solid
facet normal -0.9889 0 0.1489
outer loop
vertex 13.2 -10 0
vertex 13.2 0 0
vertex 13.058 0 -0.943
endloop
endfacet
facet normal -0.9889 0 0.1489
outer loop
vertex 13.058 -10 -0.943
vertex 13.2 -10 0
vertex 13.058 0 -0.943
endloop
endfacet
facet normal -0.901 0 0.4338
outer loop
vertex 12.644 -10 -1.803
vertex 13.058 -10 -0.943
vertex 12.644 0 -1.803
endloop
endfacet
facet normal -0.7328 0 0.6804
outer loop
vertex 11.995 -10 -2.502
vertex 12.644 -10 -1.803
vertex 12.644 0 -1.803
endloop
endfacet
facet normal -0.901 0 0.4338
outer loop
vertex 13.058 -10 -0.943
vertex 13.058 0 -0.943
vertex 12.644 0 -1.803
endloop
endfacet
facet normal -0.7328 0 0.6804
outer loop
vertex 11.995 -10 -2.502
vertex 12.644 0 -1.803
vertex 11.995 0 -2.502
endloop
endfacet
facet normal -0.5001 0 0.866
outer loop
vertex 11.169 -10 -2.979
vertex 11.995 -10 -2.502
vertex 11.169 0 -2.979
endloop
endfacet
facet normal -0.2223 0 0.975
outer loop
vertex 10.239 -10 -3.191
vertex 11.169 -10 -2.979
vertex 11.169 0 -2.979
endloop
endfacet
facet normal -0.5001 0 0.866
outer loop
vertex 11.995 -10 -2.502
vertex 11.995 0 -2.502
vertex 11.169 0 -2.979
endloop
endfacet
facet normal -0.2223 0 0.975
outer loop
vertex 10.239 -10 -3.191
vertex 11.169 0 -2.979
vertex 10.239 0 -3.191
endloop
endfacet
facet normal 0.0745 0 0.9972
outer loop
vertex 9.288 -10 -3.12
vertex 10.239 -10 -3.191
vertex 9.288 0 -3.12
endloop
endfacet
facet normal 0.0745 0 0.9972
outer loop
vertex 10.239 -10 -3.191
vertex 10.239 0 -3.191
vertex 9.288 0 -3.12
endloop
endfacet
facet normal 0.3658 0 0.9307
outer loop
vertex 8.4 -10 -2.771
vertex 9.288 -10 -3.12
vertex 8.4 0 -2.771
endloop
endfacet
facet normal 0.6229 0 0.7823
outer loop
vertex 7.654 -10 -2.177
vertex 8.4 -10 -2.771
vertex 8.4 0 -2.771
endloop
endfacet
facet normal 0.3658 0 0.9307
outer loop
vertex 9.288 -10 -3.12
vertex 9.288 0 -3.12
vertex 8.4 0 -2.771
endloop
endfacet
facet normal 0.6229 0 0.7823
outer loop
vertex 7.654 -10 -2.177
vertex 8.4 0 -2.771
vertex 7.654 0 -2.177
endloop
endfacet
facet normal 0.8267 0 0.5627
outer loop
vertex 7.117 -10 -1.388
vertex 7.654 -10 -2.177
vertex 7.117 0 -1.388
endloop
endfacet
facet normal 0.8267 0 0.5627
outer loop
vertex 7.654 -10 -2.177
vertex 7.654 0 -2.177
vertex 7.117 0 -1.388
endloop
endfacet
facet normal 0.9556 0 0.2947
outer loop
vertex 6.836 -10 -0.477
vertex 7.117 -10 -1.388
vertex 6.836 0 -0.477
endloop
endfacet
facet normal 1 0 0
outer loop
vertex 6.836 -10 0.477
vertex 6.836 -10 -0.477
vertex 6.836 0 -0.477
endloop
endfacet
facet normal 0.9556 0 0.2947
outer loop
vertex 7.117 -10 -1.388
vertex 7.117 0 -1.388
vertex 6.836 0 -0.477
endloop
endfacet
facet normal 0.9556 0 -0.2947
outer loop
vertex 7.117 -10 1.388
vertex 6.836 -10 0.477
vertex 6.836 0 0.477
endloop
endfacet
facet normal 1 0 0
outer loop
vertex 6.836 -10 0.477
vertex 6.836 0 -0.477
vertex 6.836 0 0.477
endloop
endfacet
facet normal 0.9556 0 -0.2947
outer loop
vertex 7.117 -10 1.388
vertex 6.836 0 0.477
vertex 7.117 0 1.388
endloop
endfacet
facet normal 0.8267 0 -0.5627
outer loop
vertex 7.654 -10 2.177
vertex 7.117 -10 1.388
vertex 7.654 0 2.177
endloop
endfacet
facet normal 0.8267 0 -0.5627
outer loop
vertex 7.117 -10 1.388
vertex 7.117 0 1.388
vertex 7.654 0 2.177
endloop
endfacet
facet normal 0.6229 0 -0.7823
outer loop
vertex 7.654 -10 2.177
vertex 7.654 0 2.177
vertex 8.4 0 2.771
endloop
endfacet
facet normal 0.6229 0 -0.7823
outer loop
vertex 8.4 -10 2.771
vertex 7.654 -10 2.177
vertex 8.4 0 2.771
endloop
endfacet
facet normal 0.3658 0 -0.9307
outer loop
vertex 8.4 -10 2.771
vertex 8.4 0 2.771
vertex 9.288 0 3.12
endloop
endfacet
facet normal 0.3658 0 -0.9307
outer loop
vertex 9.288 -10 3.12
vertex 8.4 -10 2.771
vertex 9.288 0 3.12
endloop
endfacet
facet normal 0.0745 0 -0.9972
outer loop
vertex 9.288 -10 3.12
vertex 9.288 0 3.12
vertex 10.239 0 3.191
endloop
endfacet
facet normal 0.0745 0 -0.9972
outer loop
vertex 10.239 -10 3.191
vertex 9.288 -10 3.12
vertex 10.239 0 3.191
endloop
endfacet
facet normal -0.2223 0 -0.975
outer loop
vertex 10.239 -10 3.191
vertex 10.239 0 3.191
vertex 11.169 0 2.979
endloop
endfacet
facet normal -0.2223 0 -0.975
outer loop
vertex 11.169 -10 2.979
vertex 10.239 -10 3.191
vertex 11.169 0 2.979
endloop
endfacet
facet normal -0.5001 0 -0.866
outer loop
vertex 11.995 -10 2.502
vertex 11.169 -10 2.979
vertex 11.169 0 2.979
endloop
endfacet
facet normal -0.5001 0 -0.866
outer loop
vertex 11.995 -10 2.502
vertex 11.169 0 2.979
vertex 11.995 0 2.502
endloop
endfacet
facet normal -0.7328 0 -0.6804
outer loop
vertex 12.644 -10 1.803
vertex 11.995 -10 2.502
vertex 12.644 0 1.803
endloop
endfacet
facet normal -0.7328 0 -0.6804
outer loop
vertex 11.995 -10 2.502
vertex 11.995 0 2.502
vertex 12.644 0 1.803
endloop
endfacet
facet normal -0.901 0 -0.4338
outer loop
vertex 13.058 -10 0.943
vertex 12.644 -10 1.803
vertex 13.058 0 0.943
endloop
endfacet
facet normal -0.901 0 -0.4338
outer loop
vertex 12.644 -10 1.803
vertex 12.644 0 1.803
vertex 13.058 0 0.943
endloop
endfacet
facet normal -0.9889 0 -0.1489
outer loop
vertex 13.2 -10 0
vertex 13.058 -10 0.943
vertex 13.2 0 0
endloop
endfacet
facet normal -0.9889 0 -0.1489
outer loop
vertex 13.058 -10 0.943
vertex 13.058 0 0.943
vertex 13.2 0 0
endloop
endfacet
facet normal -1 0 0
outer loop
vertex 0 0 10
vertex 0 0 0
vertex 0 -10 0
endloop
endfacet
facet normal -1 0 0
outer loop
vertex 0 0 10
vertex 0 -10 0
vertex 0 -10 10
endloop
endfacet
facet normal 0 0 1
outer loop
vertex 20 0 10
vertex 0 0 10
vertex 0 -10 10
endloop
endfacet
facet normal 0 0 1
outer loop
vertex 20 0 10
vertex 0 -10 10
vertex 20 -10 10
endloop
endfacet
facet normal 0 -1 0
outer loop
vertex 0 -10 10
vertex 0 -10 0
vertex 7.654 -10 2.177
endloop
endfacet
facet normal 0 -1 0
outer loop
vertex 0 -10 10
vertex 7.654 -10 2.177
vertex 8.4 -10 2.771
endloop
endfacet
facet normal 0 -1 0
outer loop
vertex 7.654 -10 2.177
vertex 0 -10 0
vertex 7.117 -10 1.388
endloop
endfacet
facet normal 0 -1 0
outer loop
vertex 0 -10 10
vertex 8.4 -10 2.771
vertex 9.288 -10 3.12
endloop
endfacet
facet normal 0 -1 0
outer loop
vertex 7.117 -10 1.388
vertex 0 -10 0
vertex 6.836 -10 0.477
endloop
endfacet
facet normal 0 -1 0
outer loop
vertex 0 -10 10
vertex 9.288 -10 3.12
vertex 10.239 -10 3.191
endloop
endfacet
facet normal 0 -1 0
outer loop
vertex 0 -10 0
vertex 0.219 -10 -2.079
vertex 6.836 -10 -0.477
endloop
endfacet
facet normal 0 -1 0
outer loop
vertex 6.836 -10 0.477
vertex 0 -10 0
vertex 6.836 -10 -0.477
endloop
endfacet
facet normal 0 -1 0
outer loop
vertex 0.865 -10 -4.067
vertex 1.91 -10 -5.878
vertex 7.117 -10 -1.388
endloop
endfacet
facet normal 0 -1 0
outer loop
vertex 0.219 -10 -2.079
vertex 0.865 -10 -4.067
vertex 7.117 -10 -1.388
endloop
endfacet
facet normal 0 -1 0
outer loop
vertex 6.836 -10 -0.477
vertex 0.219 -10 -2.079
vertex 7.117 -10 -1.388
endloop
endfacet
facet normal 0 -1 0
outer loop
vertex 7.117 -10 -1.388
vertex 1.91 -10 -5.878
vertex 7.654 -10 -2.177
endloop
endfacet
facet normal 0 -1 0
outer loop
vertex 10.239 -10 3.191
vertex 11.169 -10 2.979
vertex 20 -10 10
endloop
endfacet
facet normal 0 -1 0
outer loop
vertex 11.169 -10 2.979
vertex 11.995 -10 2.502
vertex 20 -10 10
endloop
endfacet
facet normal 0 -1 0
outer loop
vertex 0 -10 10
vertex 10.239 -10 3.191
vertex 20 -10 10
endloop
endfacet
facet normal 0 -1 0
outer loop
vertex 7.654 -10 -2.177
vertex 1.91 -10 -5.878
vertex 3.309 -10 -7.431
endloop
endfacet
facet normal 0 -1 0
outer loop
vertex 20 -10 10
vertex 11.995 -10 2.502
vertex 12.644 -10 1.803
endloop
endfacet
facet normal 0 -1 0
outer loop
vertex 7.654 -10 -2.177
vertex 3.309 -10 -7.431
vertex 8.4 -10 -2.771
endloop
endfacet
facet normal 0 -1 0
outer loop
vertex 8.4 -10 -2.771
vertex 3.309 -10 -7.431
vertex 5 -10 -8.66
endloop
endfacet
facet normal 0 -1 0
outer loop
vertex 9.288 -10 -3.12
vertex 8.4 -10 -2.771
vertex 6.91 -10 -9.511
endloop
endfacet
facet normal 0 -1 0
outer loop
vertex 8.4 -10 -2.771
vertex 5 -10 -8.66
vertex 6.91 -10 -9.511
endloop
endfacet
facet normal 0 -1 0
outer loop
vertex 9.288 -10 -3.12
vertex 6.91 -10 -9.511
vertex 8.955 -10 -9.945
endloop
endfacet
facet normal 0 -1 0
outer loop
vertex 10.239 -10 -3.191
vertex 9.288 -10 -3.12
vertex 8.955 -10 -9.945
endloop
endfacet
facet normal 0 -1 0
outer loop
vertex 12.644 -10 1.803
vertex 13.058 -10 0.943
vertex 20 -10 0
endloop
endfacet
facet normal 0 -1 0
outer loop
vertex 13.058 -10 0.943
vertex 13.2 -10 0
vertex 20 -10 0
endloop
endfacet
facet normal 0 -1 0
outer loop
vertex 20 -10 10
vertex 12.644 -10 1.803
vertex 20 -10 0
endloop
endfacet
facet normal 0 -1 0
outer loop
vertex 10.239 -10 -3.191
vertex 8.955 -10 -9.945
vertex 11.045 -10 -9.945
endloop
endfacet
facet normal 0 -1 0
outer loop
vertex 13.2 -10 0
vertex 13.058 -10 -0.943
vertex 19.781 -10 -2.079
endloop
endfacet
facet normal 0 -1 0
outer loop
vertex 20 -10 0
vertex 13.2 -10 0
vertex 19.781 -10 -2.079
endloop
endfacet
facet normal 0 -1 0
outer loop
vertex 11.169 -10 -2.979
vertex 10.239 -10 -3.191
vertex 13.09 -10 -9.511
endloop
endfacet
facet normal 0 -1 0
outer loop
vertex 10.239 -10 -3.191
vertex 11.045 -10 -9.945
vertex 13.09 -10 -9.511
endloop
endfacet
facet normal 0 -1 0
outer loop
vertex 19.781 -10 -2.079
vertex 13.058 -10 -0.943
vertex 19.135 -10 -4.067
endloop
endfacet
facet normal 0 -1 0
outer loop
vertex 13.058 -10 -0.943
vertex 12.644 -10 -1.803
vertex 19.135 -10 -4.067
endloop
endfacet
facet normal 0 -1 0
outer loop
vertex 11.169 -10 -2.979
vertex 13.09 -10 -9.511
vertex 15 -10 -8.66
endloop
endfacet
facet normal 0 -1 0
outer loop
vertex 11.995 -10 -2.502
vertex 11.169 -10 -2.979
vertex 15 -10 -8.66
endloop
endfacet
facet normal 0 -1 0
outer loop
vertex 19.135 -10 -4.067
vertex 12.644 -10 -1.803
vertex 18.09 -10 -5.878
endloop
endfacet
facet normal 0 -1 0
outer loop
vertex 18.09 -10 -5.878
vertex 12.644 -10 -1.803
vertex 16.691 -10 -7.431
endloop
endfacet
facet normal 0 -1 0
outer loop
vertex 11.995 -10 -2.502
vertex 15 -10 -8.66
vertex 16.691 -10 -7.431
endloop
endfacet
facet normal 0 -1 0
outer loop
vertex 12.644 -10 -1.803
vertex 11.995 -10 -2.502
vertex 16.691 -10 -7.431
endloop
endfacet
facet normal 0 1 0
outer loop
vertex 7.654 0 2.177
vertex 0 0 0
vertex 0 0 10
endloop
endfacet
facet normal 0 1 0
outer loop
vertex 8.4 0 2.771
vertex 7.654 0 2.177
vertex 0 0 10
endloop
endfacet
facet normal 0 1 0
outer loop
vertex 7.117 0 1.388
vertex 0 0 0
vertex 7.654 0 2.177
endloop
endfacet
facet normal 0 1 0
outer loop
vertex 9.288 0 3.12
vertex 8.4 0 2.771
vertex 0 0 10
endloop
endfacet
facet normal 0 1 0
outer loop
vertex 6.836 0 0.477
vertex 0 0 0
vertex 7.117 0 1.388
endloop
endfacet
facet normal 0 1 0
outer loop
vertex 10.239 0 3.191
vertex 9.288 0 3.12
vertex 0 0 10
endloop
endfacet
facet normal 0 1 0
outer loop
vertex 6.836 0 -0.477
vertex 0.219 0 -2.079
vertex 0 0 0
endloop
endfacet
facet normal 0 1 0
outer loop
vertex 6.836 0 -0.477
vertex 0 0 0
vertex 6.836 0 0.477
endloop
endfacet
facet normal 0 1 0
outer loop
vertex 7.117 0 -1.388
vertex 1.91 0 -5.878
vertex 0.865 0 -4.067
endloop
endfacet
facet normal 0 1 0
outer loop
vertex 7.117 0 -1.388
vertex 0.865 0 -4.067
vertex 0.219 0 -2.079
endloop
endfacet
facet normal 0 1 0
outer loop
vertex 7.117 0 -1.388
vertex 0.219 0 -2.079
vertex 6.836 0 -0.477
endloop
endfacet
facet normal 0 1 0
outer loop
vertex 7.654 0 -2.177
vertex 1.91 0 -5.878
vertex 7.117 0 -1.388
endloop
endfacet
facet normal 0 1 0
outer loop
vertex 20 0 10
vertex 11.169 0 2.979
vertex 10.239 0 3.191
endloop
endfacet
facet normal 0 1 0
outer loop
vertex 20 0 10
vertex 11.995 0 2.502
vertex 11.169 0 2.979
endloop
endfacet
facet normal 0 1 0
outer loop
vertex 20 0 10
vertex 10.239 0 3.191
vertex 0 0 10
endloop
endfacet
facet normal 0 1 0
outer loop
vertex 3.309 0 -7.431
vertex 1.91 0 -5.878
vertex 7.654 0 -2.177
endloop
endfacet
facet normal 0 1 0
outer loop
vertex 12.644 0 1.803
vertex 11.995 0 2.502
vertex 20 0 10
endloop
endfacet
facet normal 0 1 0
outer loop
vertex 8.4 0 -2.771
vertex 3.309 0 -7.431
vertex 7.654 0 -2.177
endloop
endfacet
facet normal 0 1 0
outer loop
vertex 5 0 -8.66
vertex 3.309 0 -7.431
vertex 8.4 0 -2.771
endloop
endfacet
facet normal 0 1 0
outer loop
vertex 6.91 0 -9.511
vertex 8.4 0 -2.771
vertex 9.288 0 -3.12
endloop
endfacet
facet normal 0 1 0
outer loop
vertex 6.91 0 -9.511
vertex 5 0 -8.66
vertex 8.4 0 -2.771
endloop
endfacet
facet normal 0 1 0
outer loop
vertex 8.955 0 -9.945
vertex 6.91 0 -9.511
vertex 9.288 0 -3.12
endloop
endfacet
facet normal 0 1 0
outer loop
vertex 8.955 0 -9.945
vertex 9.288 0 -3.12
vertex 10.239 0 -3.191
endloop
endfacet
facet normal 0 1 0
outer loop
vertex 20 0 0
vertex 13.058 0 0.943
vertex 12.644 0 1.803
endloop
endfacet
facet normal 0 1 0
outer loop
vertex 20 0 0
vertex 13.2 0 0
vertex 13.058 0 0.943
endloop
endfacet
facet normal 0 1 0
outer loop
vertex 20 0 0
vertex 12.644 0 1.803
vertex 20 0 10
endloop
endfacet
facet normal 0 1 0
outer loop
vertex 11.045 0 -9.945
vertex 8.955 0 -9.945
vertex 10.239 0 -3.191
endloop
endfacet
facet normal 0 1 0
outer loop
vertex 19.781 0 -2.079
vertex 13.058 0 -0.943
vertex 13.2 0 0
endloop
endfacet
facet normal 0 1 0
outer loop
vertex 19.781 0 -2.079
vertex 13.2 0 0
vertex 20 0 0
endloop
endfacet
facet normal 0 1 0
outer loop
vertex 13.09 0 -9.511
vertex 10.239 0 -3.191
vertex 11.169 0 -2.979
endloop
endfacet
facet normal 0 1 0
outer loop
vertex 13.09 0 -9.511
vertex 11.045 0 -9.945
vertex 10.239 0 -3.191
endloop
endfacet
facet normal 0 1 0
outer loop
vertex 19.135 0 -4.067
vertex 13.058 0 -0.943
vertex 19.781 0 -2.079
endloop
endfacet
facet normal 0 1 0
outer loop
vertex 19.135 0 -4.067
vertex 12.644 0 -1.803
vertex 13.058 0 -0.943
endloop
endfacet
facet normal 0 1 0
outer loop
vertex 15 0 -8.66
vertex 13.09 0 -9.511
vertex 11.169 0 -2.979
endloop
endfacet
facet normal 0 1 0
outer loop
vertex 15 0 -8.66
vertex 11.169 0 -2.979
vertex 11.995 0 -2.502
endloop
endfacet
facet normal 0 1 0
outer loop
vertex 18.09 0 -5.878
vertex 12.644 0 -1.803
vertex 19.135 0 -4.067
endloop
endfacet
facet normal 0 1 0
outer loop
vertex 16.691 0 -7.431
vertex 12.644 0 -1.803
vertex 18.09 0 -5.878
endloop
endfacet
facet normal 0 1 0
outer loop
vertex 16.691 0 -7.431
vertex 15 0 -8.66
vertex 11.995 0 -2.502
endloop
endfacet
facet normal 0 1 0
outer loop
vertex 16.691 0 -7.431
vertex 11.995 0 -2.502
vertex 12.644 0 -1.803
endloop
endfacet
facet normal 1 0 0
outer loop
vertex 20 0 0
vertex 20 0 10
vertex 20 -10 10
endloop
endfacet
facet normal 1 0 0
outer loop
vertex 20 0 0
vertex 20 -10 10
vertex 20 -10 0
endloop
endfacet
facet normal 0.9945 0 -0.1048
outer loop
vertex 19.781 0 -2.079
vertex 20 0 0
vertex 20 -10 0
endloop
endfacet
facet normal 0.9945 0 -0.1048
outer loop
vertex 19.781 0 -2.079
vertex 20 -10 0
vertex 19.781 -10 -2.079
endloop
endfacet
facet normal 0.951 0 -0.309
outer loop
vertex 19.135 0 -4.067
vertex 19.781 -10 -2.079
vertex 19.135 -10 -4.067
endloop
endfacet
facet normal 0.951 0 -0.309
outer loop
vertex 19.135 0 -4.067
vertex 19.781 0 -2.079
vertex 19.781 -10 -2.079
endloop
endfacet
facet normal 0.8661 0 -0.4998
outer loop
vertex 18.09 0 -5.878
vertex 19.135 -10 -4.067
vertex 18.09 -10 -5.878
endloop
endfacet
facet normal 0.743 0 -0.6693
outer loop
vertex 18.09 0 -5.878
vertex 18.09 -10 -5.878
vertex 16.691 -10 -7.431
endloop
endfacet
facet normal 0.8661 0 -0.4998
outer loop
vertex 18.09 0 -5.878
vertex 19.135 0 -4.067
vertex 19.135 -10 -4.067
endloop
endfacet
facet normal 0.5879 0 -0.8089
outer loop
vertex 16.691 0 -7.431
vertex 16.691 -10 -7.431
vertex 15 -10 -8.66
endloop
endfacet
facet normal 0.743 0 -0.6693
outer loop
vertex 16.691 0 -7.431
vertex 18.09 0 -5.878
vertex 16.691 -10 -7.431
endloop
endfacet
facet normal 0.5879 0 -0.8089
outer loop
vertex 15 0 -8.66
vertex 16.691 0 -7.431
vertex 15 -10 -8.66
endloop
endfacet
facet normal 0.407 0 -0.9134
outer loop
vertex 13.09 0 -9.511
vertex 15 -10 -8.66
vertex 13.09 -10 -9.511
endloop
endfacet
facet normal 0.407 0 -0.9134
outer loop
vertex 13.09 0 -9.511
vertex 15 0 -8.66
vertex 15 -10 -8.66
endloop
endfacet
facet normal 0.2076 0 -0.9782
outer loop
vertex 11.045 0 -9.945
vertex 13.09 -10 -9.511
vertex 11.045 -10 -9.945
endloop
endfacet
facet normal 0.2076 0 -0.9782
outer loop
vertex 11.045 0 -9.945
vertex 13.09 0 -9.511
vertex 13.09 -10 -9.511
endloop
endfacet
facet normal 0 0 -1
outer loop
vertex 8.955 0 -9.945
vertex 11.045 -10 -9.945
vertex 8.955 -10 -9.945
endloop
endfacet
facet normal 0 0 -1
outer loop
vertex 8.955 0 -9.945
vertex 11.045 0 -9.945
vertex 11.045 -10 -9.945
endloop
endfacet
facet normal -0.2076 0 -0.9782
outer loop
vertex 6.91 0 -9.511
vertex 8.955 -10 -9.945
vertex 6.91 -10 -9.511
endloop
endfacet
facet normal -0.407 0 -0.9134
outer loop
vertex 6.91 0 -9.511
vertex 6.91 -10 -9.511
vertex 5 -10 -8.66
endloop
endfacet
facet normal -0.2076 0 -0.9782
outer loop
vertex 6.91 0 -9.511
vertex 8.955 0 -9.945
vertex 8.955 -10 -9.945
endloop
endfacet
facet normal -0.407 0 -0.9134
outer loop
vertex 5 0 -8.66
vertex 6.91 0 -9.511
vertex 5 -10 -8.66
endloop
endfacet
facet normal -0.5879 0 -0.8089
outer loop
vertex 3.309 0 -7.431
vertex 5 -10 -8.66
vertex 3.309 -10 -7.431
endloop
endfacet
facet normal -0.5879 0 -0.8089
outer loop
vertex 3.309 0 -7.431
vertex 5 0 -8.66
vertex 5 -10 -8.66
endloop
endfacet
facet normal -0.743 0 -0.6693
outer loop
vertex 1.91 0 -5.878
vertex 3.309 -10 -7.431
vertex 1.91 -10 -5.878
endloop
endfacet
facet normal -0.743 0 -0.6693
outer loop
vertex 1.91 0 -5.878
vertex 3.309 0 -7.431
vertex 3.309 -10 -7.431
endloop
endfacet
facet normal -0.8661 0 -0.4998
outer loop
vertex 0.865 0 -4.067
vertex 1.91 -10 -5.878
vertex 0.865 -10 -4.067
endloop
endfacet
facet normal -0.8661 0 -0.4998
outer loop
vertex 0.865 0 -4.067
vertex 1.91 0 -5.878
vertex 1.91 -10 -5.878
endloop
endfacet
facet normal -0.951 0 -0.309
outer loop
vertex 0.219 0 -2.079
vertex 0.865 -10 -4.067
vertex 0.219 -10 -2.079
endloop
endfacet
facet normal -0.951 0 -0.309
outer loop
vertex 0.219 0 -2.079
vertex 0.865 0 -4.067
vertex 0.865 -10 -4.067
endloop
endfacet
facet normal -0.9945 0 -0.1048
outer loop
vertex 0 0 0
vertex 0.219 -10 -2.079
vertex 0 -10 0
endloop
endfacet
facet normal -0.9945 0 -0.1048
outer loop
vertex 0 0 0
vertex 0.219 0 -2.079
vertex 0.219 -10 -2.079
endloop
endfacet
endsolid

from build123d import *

# Parameters (mm, degrees)
SKETCH1_R           = 3.2
BOSS_EXTRUDE1_DEPTH = 10


with BuildPart() as part:
    # Sketch1 → Boss-Extrude1 (new body)
    with BuildSketch(Plane(origin=(0, 0, 0), x_dir=(1, 0, 0), z_dir=(0, 1, 0))):
        with BuildLine():
            Line((0, 0), (0, -10))
            Line((0, -10), (20, -10))
            Line((20, -10), (20, 0))
            ThreePointArc((20, 0), (10, 10), (0, 0))
        make_face()
        with Locations((10, 0)):
            Circle(SKETCH1_R, mode=Mode.SUBTRACT)
    extrude(amount=-BOSS_EXTRUDE1_DEPTH)


solid = part.part
